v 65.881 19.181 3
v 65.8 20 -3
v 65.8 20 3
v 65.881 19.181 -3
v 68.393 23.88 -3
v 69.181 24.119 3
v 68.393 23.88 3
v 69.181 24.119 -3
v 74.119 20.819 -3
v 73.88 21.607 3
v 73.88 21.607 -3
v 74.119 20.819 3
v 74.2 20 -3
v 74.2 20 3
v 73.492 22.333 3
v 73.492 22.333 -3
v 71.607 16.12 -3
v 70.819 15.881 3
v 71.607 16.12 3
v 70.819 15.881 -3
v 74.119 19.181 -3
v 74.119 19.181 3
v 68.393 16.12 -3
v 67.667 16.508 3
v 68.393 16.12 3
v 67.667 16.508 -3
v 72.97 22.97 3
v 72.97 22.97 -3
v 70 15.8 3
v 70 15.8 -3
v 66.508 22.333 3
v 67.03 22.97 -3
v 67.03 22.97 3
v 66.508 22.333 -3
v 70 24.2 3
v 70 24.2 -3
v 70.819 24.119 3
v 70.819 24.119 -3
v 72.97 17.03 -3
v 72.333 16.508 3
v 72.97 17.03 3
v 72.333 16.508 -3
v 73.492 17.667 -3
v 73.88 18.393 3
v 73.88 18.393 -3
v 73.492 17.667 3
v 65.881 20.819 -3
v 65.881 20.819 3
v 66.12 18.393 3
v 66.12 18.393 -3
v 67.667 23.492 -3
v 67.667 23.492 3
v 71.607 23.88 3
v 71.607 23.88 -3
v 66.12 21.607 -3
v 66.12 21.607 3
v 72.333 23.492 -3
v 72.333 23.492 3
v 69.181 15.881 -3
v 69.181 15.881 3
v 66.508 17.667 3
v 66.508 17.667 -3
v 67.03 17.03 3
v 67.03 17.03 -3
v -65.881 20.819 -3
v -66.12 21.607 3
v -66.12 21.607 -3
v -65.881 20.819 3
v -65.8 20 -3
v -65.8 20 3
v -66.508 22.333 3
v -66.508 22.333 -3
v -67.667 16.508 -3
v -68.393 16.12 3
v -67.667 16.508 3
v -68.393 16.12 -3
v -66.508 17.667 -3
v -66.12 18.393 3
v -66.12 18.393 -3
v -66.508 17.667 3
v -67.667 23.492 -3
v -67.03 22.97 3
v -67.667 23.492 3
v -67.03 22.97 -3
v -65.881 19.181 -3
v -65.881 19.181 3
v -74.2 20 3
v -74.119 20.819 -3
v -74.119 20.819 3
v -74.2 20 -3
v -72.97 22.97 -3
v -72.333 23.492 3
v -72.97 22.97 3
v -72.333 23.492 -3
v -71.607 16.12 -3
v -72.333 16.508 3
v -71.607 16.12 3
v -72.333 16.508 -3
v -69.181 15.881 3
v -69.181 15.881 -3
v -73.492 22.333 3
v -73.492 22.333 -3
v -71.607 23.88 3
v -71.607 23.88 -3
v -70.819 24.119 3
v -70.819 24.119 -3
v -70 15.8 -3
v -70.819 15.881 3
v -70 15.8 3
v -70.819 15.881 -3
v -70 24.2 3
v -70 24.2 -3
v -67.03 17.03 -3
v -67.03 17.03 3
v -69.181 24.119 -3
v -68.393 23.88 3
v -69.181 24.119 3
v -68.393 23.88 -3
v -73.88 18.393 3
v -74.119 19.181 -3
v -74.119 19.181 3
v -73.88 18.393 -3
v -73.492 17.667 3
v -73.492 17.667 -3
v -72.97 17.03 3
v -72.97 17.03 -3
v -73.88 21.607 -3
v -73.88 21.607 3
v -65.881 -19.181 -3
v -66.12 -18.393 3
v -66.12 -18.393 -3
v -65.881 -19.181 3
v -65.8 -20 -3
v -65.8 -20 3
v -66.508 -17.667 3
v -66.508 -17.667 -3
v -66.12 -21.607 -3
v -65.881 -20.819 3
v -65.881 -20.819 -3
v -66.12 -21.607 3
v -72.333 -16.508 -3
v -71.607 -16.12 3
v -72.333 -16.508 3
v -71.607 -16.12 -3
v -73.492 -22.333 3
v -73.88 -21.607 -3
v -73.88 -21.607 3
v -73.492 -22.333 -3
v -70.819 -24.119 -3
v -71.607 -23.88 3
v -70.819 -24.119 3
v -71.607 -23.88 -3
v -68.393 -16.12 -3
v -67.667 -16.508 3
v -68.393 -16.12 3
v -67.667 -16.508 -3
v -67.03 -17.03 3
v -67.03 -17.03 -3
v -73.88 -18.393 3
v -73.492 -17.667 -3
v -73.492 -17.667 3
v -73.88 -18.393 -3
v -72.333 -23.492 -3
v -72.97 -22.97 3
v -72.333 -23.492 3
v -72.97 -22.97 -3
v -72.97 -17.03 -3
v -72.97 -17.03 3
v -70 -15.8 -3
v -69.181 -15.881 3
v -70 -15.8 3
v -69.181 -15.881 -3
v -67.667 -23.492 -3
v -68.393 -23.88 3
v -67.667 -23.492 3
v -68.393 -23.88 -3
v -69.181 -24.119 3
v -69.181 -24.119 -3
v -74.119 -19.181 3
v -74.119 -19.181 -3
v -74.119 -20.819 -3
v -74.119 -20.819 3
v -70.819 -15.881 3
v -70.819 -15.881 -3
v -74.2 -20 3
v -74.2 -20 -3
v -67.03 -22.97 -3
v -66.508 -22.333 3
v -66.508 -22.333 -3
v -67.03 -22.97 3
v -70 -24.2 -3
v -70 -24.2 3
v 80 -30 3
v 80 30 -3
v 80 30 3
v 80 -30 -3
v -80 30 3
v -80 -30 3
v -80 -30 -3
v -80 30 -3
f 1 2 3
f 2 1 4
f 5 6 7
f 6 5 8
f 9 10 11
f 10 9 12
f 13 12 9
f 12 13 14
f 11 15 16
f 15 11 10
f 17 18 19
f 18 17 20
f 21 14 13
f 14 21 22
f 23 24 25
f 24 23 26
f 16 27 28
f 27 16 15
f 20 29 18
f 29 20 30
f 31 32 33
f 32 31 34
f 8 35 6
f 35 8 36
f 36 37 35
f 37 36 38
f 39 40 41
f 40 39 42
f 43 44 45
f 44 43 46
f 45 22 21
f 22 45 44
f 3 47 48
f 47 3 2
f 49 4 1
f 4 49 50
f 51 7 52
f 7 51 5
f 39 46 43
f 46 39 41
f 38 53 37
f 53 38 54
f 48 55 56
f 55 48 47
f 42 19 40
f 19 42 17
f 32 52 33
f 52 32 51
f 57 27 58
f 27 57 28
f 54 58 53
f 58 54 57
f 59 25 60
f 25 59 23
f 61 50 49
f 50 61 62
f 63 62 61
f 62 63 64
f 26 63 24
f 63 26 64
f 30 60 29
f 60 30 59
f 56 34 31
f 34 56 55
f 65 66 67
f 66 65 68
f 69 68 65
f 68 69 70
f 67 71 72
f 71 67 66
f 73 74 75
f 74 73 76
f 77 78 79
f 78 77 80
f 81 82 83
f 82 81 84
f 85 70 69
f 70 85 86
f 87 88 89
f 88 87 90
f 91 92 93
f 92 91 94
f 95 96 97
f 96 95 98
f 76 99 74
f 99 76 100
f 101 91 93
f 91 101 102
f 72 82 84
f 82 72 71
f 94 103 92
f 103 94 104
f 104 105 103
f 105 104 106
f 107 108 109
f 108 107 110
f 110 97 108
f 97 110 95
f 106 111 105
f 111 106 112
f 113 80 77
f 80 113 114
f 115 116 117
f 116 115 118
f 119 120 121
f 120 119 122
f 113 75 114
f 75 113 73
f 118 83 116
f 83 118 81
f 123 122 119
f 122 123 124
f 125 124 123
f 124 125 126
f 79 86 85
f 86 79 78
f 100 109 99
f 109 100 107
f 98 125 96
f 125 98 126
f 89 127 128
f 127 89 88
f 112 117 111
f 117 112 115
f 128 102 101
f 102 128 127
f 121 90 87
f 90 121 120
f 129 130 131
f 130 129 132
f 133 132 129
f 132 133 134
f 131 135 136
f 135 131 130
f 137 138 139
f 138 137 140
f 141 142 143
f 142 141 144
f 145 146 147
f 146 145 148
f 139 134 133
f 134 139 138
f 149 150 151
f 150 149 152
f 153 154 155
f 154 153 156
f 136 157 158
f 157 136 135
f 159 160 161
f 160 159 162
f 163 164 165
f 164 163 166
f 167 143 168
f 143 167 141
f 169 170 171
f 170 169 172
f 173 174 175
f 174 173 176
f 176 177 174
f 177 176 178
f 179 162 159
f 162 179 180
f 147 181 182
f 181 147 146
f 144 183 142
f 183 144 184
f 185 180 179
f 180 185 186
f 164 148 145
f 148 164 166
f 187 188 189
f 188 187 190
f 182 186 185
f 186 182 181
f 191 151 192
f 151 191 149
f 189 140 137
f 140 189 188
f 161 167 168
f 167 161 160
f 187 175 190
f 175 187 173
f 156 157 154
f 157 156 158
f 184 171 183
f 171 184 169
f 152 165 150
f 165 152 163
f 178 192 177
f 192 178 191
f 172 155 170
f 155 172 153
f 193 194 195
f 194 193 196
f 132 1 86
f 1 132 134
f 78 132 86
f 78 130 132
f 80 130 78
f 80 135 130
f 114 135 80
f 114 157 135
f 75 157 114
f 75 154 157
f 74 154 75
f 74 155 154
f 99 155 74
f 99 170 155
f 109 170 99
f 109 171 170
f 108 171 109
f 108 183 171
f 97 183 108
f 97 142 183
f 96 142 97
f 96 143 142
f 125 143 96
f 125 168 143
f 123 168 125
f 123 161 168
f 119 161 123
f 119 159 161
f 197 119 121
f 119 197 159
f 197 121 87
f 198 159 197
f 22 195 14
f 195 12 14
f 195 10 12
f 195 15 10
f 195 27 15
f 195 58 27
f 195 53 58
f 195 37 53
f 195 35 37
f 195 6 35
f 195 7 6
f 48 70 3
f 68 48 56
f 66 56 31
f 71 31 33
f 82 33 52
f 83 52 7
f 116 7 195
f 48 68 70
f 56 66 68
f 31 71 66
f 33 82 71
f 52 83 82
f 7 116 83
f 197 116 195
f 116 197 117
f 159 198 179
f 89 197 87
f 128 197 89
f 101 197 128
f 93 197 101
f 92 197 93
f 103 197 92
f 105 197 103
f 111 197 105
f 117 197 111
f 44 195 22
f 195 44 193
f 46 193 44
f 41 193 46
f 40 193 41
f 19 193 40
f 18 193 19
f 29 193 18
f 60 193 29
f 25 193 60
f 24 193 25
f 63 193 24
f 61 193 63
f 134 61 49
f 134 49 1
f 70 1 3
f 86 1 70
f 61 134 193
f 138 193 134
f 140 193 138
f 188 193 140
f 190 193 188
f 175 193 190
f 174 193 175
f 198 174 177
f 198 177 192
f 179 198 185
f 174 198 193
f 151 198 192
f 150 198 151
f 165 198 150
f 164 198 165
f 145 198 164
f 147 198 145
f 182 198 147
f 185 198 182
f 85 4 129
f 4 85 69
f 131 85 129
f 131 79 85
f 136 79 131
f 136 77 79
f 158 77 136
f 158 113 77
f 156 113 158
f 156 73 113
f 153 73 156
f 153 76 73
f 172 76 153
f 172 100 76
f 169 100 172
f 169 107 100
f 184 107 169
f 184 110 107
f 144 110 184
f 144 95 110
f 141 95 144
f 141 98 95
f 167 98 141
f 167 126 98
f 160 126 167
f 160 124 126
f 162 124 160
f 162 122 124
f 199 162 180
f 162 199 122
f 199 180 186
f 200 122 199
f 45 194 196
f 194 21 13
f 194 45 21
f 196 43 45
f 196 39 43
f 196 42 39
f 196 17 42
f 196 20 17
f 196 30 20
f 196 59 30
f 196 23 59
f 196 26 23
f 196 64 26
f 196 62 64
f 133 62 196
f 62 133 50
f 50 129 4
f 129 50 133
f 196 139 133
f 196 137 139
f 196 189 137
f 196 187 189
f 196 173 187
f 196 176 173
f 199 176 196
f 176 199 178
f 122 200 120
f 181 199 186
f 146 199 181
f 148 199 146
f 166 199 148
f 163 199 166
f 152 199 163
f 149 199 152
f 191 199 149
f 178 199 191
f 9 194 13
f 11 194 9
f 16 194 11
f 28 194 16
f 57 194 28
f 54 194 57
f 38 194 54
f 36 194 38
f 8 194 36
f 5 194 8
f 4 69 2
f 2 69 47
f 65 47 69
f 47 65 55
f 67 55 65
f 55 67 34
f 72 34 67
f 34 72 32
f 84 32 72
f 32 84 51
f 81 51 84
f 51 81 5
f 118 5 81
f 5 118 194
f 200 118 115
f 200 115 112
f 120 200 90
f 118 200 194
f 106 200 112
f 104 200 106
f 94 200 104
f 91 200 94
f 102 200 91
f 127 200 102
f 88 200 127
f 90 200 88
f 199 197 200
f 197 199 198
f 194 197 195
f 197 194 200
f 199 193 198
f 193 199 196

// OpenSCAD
$fn = 32;

// ----------------------------------------------------------------------
// Corner plate 160 x 60 x 6
// 3 holes, centres taken from the edge offset
// ----------------------------------------------------------------------

// --- parameters (mm) ---
plate = [160, 60, 6];  // overall size (x, y, z)
holes = 3;             // number of holes the drawing asks for
hole_d = 8.4;          // hole diameter
edge = 10;             // hole centre offset from the plate edge

// --- derived feature positions (mm) ---
corner_x = plate[0] / 2 - edge;  // = 70   corner hole X
corner_y = plate[1] / 2 - edge;  // = 20   corner hole Y
feature_centers = [
  [corner_x, corner_y],
  [-corner_x, corner_y],
  [-corner_x, -corner_y]
];   // hole centres the loop below drills

// plate outline, every hole drilled through with the same cutters
difference() {
  cube(plate, center = true);
  for (centre = feature_centers)
    translate([centre[0], centre[1], 0])
      cylinder(d = hole_d, h = plate[2] + 2, center = true);
}
